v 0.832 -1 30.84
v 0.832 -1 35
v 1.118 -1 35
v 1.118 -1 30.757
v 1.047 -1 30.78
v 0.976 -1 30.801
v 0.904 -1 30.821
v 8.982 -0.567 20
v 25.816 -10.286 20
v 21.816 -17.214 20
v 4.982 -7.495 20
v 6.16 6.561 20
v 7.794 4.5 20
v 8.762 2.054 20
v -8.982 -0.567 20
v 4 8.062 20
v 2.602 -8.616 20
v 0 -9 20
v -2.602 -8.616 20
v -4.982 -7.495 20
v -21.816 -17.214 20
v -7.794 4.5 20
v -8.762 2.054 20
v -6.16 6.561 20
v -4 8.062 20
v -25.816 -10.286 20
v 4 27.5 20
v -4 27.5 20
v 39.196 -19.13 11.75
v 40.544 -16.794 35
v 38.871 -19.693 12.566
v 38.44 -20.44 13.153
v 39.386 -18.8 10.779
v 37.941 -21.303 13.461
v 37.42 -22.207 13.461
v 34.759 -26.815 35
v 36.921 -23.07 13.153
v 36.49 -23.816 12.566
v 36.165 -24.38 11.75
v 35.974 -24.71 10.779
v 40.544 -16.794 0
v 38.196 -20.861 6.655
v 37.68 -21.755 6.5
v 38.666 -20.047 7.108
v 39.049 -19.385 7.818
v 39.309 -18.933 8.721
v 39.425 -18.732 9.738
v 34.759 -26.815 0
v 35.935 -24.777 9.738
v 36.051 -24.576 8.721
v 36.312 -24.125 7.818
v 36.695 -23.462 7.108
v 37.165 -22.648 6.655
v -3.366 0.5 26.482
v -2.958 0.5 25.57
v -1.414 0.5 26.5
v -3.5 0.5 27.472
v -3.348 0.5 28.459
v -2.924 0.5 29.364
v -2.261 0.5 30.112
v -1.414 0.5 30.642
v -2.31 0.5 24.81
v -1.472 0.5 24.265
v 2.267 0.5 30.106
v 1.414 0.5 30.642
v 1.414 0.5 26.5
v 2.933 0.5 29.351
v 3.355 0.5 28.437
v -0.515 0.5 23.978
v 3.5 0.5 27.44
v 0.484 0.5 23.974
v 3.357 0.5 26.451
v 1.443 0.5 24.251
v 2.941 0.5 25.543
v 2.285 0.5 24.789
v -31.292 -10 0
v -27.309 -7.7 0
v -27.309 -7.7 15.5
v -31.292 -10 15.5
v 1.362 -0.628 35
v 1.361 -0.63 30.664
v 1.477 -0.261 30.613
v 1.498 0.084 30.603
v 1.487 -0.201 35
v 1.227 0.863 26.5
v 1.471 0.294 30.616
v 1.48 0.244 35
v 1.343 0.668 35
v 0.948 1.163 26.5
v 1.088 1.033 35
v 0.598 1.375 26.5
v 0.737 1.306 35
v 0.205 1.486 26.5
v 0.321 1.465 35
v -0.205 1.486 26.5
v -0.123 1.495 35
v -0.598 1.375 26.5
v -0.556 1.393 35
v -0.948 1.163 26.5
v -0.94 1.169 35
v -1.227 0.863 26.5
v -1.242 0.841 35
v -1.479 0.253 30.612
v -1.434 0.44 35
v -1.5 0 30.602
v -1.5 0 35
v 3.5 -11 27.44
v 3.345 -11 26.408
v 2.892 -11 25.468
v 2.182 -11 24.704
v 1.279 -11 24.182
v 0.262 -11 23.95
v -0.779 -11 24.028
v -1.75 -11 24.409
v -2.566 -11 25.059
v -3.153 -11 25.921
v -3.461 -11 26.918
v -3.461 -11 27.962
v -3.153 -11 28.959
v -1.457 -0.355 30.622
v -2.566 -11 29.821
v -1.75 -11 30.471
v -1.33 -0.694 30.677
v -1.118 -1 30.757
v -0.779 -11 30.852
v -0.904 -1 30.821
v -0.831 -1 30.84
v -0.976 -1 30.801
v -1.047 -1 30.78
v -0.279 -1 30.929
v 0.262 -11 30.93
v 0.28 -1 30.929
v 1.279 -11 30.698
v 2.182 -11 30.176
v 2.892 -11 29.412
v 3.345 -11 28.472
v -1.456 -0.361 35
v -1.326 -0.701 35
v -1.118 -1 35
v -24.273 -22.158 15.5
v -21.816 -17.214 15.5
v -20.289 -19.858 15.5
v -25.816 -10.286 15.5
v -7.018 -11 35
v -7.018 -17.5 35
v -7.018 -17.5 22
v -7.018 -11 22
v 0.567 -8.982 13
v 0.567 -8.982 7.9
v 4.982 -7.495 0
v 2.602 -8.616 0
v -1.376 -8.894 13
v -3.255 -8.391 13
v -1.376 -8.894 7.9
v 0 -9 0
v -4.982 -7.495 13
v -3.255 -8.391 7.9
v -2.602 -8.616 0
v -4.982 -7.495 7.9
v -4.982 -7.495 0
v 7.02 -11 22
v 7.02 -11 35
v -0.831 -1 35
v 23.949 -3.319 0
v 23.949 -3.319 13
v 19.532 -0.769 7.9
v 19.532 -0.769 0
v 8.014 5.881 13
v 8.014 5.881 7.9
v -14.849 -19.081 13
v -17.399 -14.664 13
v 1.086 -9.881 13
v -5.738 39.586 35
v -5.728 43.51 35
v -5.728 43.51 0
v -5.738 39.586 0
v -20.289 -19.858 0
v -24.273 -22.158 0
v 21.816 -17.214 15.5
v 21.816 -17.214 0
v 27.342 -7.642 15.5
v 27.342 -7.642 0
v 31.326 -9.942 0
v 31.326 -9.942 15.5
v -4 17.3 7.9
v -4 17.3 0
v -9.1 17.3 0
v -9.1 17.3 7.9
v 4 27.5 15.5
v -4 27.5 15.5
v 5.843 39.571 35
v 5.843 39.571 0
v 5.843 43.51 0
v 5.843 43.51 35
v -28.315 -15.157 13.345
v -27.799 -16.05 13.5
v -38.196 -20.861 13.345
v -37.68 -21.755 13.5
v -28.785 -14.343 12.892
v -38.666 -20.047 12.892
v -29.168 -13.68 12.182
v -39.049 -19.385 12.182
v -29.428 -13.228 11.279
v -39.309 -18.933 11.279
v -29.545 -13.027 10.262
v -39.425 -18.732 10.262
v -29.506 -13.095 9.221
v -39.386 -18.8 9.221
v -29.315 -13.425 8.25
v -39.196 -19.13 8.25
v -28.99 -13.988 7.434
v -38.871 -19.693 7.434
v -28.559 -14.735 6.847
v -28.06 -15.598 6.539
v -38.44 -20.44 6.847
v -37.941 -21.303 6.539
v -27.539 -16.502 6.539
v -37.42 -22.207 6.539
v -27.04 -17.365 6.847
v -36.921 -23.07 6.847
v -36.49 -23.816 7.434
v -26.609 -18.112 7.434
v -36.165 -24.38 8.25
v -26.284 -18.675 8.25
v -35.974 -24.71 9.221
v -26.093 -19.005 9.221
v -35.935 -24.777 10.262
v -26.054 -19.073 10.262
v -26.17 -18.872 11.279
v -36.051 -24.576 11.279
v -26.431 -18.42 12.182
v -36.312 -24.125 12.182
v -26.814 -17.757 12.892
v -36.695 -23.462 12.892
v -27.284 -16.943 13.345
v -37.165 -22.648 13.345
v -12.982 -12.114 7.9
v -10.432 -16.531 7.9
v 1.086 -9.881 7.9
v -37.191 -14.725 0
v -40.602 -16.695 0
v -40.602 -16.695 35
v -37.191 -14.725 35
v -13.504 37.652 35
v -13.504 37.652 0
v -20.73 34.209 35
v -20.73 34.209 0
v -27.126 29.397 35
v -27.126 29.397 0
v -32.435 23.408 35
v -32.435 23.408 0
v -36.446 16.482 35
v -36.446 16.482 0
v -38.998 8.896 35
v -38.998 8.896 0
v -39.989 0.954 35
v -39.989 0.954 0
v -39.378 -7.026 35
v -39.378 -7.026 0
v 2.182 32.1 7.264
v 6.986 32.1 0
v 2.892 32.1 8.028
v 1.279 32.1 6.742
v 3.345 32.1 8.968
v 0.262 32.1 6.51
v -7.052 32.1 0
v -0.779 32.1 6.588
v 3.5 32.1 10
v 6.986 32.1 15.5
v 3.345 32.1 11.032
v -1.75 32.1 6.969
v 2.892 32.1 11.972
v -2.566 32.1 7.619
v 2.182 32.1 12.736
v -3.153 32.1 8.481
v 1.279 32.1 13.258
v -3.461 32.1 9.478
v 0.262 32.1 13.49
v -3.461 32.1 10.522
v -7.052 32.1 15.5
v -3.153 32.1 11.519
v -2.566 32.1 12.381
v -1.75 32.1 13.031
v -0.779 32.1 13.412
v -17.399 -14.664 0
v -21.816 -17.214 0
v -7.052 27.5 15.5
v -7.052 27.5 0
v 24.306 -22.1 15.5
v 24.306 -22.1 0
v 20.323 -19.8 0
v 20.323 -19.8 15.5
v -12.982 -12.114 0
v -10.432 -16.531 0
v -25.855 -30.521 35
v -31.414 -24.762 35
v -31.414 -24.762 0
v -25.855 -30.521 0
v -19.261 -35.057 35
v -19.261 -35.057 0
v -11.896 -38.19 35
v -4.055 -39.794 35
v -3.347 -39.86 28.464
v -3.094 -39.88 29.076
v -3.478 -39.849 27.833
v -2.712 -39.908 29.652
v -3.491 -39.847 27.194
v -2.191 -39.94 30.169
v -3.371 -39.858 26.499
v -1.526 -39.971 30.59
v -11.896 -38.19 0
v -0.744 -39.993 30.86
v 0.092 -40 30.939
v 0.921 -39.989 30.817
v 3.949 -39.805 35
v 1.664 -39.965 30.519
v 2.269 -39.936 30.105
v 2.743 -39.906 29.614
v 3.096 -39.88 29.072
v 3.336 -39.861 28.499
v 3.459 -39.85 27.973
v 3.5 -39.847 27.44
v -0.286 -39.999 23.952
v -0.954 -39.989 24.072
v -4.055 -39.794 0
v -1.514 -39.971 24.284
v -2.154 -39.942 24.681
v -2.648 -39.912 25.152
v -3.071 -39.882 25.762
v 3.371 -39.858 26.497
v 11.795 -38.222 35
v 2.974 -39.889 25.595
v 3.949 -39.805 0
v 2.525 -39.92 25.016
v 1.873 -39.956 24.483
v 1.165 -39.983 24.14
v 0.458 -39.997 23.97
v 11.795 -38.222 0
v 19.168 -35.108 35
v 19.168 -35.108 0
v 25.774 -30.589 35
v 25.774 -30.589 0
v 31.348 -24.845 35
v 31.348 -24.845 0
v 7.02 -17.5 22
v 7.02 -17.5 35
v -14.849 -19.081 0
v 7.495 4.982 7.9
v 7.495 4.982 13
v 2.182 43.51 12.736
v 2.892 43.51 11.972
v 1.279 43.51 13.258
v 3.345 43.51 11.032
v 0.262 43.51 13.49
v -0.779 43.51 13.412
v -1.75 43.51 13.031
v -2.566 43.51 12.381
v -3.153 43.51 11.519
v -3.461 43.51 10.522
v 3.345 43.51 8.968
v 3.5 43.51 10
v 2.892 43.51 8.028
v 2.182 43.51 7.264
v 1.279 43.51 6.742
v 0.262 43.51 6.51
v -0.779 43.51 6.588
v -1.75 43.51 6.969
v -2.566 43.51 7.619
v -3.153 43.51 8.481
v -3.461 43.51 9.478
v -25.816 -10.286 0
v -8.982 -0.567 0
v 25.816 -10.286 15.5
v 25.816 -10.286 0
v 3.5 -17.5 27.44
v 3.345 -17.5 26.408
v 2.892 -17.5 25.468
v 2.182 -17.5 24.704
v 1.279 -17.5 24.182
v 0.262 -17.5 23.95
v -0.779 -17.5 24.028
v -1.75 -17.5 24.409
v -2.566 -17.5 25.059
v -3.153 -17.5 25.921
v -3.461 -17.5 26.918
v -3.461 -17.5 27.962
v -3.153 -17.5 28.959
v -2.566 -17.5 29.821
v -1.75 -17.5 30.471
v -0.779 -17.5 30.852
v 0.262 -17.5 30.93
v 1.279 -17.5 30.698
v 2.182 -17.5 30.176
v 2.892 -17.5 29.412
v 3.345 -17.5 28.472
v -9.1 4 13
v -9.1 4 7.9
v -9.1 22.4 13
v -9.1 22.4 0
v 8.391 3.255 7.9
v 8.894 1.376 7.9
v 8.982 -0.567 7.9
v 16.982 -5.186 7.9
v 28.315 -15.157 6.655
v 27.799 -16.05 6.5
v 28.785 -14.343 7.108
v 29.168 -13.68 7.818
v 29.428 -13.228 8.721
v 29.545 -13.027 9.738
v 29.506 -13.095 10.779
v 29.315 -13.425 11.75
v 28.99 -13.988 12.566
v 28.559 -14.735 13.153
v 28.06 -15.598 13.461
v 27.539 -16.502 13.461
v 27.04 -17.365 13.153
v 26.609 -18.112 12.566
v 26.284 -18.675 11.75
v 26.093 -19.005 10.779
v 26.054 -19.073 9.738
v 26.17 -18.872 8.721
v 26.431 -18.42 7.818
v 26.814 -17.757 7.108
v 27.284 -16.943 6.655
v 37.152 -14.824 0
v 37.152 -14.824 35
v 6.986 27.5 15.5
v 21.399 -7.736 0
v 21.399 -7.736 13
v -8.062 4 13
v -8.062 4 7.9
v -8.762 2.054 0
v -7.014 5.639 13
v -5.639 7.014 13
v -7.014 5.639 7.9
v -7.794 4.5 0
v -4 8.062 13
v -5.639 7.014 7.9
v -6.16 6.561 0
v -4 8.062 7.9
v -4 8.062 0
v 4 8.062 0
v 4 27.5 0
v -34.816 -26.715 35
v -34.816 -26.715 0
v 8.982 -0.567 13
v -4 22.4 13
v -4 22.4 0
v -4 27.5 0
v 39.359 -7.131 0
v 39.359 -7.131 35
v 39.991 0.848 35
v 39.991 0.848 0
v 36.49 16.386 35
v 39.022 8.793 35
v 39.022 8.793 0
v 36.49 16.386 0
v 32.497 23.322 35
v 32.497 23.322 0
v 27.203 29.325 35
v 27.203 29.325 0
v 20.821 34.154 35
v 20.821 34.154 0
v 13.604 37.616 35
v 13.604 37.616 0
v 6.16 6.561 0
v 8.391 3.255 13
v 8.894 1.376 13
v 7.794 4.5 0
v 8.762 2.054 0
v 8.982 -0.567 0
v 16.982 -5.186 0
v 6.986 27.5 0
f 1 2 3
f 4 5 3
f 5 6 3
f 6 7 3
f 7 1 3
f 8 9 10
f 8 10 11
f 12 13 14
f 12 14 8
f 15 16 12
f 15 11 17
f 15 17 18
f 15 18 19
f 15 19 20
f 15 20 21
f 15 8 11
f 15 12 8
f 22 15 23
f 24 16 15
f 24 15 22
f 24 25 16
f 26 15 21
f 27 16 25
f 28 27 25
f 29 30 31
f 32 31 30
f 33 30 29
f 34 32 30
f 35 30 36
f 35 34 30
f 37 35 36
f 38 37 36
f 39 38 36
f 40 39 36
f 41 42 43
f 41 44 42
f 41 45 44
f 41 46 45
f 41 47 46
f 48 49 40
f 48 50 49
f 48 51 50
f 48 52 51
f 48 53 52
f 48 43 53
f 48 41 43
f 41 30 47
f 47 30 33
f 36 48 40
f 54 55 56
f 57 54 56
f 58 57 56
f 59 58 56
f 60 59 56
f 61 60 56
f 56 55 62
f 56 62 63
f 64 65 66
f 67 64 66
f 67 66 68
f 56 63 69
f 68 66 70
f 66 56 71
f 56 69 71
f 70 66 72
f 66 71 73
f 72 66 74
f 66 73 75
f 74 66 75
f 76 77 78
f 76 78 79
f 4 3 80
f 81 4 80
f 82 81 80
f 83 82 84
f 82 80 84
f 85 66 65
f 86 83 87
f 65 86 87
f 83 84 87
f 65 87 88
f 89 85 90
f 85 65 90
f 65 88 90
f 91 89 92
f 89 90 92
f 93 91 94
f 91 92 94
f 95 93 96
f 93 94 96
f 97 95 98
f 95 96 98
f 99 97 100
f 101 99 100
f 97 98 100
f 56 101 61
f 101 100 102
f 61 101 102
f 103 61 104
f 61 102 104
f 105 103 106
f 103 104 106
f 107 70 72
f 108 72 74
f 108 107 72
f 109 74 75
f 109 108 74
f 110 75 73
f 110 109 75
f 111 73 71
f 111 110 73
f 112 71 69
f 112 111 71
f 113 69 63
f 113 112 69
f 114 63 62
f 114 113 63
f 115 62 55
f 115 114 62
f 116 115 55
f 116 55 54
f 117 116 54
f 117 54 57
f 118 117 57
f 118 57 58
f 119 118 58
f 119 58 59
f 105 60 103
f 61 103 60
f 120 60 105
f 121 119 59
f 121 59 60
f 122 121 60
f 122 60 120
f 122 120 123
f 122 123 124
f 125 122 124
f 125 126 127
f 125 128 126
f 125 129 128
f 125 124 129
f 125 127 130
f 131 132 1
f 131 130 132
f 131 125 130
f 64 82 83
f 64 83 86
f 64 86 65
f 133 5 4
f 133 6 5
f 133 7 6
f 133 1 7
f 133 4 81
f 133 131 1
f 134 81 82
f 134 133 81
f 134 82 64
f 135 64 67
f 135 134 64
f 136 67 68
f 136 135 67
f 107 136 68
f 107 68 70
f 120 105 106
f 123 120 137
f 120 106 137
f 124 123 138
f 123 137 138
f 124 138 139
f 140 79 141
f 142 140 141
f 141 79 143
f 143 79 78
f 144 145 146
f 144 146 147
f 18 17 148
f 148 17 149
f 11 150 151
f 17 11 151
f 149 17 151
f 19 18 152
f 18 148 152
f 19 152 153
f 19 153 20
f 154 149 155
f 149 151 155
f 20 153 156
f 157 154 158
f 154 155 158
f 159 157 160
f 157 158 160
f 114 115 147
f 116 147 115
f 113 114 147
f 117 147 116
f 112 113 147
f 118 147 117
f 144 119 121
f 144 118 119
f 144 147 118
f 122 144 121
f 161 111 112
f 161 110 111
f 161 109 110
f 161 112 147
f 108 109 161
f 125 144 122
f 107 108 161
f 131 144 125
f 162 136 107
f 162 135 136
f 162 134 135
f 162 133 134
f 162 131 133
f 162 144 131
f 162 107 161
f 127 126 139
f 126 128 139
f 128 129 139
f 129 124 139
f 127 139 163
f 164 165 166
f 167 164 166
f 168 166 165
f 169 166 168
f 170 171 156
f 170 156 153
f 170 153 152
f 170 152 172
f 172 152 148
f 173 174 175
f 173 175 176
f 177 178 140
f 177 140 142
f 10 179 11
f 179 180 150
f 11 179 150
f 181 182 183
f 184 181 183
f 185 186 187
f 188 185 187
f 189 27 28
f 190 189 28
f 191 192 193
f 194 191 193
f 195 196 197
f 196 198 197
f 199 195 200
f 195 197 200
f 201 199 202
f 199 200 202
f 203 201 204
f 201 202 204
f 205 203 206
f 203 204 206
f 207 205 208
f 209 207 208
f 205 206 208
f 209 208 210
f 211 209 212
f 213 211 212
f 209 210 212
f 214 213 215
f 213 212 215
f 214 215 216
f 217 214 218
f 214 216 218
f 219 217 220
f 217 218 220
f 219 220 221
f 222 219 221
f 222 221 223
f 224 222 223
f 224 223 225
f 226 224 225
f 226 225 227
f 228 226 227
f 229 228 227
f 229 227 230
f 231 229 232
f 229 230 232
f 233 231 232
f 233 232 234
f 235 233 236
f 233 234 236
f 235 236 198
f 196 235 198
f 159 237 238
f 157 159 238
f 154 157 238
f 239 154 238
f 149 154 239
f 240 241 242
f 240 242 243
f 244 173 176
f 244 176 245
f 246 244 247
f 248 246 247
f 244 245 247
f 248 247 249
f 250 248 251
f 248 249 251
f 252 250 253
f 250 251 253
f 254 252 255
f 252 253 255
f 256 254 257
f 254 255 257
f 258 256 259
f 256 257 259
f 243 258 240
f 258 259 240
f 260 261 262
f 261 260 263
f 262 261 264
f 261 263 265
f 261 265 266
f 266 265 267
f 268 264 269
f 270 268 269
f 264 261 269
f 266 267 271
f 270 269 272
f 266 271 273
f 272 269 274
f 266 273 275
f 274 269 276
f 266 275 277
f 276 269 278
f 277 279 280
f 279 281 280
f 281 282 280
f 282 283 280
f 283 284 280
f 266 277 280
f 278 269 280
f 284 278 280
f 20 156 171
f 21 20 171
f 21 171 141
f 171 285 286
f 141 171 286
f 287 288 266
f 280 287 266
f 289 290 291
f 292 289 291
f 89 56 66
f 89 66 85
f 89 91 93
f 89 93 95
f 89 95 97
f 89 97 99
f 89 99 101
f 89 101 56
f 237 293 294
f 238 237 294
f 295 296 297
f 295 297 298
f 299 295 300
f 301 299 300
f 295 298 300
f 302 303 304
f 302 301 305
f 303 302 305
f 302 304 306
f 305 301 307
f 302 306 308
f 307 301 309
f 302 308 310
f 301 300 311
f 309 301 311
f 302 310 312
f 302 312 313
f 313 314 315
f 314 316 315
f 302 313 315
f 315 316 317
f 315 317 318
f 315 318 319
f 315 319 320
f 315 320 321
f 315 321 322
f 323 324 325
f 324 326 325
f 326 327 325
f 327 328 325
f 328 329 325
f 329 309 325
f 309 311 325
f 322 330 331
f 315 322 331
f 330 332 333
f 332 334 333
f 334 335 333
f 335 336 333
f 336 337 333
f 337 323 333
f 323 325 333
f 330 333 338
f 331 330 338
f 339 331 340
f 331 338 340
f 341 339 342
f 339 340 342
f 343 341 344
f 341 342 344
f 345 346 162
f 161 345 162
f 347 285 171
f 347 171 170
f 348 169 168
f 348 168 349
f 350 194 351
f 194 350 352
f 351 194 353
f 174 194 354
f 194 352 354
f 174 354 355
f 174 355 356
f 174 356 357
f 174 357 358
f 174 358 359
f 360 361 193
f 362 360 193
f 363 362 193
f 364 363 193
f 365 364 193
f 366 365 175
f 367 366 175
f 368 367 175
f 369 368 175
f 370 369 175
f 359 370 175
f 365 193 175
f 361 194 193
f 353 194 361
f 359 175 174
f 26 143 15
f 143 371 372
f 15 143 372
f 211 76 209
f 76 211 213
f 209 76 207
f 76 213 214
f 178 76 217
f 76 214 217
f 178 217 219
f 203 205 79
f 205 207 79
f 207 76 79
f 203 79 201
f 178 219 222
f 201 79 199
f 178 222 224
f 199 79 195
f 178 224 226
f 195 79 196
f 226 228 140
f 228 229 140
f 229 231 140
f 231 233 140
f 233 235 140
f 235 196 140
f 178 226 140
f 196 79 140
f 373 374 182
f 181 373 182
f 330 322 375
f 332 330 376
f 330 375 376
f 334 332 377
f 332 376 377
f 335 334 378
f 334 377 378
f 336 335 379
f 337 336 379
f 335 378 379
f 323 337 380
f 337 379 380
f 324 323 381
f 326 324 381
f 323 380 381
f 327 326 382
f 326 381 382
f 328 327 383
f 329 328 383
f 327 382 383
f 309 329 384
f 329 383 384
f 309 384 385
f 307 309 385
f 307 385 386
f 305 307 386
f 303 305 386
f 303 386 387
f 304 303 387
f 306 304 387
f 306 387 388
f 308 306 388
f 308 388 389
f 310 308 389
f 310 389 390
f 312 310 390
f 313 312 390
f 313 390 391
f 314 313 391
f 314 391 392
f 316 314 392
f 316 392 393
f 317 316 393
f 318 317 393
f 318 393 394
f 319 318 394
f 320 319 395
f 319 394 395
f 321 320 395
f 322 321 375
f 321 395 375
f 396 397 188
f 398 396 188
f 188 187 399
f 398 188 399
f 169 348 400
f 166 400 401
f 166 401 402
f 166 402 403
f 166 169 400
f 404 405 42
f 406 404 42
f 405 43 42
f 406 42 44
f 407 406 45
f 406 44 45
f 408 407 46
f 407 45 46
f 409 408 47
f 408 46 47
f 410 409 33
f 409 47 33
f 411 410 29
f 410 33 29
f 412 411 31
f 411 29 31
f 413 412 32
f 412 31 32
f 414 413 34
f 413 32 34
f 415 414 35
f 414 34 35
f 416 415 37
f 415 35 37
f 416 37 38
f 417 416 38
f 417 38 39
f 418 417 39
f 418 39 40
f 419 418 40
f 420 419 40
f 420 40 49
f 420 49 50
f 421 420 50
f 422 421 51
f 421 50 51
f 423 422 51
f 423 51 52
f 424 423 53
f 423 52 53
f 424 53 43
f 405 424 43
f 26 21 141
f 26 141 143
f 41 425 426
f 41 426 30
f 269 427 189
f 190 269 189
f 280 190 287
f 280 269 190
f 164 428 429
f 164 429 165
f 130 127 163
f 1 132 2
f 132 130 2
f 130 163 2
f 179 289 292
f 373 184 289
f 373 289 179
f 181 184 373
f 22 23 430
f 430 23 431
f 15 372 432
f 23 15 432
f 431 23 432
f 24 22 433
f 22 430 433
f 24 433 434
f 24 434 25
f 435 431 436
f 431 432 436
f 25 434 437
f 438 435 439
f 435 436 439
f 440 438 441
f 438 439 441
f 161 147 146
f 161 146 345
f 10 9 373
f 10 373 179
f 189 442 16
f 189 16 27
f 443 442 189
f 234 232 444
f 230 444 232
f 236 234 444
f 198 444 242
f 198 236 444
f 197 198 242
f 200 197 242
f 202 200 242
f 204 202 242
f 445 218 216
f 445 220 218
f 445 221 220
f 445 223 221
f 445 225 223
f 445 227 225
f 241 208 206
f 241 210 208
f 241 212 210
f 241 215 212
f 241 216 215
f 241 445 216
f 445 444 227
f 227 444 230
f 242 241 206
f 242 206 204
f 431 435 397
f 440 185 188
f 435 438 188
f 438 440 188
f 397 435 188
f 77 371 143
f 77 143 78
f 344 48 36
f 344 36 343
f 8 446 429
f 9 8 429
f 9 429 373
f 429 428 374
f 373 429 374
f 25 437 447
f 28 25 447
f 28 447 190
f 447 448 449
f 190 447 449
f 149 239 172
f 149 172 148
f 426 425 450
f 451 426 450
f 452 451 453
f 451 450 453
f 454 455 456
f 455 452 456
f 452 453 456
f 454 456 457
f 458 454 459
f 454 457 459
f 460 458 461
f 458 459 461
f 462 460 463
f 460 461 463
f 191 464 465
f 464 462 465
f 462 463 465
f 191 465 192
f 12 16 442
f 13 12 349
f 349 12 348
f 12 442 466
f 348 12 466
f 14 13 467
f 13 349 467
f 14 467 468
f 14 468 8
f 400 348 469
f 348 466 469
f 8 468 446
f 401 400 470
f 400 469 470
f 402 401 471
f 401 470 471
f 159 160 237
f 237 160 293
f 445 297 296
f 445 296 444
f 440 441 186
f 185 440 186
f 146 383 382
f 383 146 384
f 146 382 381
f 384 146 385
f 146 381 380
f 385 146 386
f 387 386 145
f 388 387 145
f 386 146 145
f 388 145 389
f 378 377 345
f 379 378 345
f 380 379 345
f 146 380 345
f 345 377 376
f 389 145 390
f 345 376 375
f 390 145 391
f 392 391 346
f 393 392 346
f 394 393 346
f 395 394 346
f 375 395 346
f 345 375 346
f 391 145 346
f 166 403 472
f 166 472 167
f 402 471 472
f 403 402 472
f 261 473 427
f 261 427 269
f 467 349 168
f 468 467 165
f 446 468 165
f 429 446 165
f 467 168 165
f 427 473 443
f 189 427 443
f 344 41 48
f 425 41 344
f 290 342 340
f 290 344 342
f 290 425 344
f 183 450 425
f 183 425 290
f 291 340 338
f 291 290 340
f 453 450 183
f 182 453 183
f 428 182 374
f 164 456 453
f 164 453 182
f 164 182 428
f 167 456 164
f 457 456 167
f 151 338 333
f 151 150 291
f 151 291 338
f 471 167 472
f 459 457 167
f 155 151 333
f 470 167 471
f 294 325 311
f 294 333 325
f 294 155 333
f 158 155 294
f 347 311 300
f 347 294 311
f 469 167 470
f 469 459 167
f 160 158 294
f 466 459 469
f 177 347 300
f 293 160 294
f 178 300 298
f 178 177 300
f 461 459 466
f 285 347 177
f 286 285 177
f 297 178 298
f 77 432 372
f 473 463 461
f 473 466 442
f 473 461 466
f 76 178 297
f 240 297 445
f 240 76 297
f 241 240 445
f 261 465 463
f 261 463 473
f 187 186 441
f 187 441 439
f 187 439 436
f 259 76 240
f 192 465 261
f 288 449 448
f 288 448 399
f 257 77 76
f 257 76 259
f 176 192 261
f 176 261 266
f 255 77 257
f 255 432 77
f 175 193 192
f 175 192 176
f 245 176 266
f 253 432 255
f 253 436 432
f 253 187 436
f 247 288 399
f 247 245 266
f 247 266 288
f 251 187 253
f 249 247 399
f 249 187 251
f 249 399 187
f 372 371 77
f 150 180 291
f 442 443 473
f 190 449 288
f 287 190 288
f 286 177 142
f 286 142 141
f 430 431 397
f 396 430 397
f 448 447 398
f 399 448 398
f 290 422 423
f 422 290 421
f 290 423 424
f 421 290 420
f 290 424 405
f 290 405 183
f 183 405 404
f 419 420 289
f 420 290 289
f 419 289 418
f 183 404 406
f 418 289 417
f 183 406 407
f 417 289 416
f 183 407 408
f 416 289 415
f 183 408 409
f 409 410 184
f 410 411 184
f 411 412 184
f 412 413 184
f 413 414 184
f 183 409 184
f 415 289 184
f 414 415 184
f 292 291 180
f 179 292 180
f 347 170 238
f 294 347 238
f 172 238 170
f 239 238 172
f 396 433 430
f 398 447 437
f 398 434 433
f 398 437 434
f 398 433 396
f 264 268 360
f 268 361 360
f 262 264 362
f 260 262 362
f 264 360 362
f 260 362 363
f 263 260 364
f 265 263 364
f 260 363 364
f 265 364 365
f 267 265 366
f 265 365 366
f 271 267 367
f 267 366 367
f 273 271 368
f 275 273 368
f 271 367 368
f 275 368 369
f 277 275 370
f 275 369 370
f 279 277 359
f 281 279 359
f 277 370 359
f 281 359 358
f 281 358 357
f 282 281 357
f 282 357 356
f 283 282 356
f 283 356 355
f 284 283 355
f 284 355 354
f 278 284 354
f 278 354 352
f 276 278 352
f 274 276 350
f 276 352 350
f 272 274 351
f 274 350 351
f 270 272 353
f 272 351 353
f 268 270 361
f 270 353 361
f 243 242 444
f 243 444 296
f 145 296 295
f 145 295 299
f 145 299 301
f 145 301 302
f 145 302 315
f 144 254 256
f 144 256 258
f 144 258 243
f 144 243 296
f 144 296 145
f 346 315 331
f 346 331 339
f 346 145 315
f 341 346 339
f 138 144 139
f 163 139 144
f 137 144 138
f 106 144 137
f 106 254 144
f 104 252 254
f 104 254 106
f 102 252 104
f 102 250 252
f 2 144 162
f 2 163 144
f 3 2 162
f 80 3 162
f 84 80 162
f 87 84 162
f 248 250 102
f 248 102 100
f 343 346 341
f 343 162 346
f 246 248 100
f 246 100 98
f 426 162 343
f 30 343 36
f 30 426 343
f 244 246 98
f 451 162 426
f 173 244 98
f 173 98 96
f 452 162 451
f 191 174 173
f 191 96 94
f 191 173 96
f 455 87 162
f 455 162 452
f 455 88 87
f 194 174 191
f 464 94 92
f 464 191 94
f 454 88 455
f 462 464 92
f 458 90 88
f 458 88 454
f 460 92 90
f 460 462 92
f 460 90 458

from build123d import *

# Parameters (mm, degrees)
SKETCH2_R                = 40
BOSS_EXTRUDE1_DEPTH      = 35
SKETCH3_W                = 8
SKETCH3_H                = 35
CUT_EXTRUDE1_DEPTH       = 20
SKETCH4_R                = 3.5
CUT_EXTRUDE2_DEPTH       = 80
SKETCH5_R                = 3.5
CUT_EXTRUDE3_DEPTH       = 50
SKETCH6_R                = 3.5
CUT_EXTRUDE4_DEPTH       = 50
SKETCH8_W                = 14.038446545
SKETCH8_H                = 6.5
CUT_EXTRUDE5_DEPTH       = 15.5
SKETCH11_W               = 8
SKETCH11_H               = 6.5
BOSS_EXTRUDE2_DEPTH      = 4.5
BOSS_EXTRUDE3_DEPTH      = 15.5
BOSS_EXTRUDE4_DEPTH      = 35
SKETCH18_R               = 3.5
CUT_EXTRUDE9_DEPTH       = 25
SKETCH19_R               = 3.5
CUT_EXTRUDE10_DEPTH      = 25
SKETCH20_R               = 3.5
CUT_EXTRUDE11_DEPTH      = 25
SKETCH21_W               = 5.1
SKETCH21_H               = 18.4
CUT_EXTRUDE12_DEPTH      = 13
SKETCH23_W               = 5.1
SKETCH23_H               = 18.4
CUT_EXTRUDE13_DEPTH      = 13
SKETCH22_W               = 5.1
SKETCH22_H               = 13.3
BOSS_EXTRUDE5_DEPTH      = 7.9
CUT_EXTRUDE14_DEPTH      = 8.5
SKETCH25_R               = 9
CUT_EXTRUDE15_DEPTH      = 20
SKETCH27_W               = 14.038446545
SKETCH27_H               = 6.5
CUT_EXTRUDE16_DEPTH      = 13
SKETCH28_R               = 3.5
CUT_EXTRUDE18_DEPTH      = 18
CUT_EXTRUDE18_DEPTH_BACK = 50


with BuildPart() as part:
    # Sketch2 → Boss-Extrude1 (new body)
    with BuildSketch(Plane.XY):
        Circle(SKETCH2_R)
    extrude(amount=BOSS_EXTRUDE1_DEPTH)

    # Sketch3 → Cut-Extrude1 (cut)
    with BuildSketch(Plane(origin=(0, 0, 0), x_dir=(-1, 0, 0), z_dir=(0, 0, -1))):
        with Locations((0, 21.5)):
            Rectangle(SKETCH3_W, SKETCH3_H)
        Polygon((31.774990748, -22.964101615), (35.774990748, -16.035898385), (5.464101615, 1.464101615), (1.464101615, -5.464101615), align=None)
        Polygon((-35.774990748, -16.035898385), (-31.774990748, -22.964101615), (-1.464101615, -5.464101615), (-5.464101615, 1.464101615), align=None)
    extrude(amount=-CUT_EXTRUDE1_DEPTH, mode=Mode.SUBTRACT)

    # Sketch4 → Cut-Extrude2 (cut)
    with BuildSketch(Plane(origin=(-3.464101615, -2, 0), x_dir=(0, 0, 1), z_dir=(-0.866025404, -0.5, 0))):
        with Locations((10, 0)):
            Circle(SKETCH4_R)
    extrude(amount=CUT_EXTRUDE2_DEPTH, mode=Mode.SUBTRACT)

    # Sketch5 → Cut-Extrude3 (cut)
    with BuildSketch(Plane(origin=(0, 4, 0), x_dir=(1, 0, 0), z_dir=(0, 1, 0))):
        with Locations((0, -10)):
            Circle(SKETCH5_R)
    extrude(amount=CUT_EXTRUDE3_DEPTH, mode=Mode.SUBTRACT)

    # Sketch6 → Cut-Extrude4 (cut)
    with BuildSketch(Plane(origin=(3.464101615, -2, 0), x_dir=(0, 0, -1), z_dir=(0.866025404, -0.5, 0))):
        with Locations((-10, 0)):
            Circle(SKETCH6_R)
    extrude(amount=CUT_EXTRUDE4_DEPTH, mode=Mode.SUBTRACT)

    # Sketch8 → Cut-Extrude5 (cut)
    with BuildSketch(Plane(origin=(0, 0, 0), x_dir=(-1, 0, 0), z_dir=(0, 0, -1))):
        Polygon((-32.971083956, -10.892407408), (-25.951860683, -23.050058746), (-20.322695558, -19.800058746), (-27.341918831, -7.642407408), align=None)
        with Locations((0.033217181, 30.75)):
            Rectangle(SKETCH8_W, SKETCH8_H)
        Polygon((27.30870165, -7.699941254), (32.937866774, -10.949941254), (25.918643502, -23.107592592), (20.289478377, -19.857592592), align=None)
    extrude(amount=-CUT_EXTRUDE5_DEPTH, mode=Mode.SUBTRACT)

    # Sketch11 → Boss-Extrude2 (add)
    with BuildSketch(Plane(origin=(0, 0, 20), x_dir=(-1, 0, 0), z_dir=(0, 0, -1))):
        with Locations((0, 30.75)):
            Rectangle(SKETCH11_W, SKETCH11_H)
        Polygon((25.815698604, -10.285898385), (31.444863729, -13.535898385), (27.444863729, -20.464101615), (21.815698604, -17.214101615), align=None)
        Polygon((-21.815698604, -17.214101615), (-27.444863729, -20.464101615), (-31.444863729, -13.535898385), (-25.815698604, -10.285898385), align=None)
    extrude(amount=BOSS_EXTRUDE2_DEPTH)

    # Sketch12 → Boss-Extrude3 (add)
    with BuildSketch(Plane(origin=(0, 0, 15.5), x_dir=(-1, 0, 0), z_dir=(0, 0, -1))):
        Polygon((-6.986006091, 32.1), (7.052440454, 32.1), (7.052440454, 34), (4, 34), (4, 39), (-4, 39), (-4, 34), (-6.986006091, 34), align=None)
        Polygon((25.918643502, -23.107592592), (27.444863729, -20.464101615), (31.774990748, -22.964101615), (35.774990748, -16.035898385), (31.444863729, -13.535898385), (32.937866774, -10.949941254), (31.292418507, -9.999941254), (24.273195235, -22.157592592), align=None)
        Polygon((-32.971083956, -10.892407408), (-31.444863729, -13.535898385), (-35.774990748, -16.035898385), (-31.774990748, -22.964101615), (-27.444863729, -20.464101615), (-25.951860683, -23.050058746), (-24.306412416, -22.100058746), (-31.325635688, -9.942407408), align=None)
    extrude(amount=BOSS_EXTRUDE3_DEPTH)

    # Sketch17 → Boss-Extrude4 (add)
    with BuildSketch(Plane(origin=(0, 0, 0), x_dir=(-1, 0, 0), z_dir=(0, 0, -1))):
        Polygon((-5.842787082, 32.897450406), (-5.842787082, 43.509531182), (5.727819383, 43.509531182), (5.754751517, 32.897450406), align=None)
        Polygon((31.411421312, -11.388723161), (25.612652013, -21.432486209), (34.816449619, -26.715202685), (40.601752851, -16.69476355), align=None)
        Polygon((-25.568634231, -21.508727245), (-31.36740353, -11.464964197), (-40.544269002, -16.794328497), (-34.75896577, -26.814767633), align=None)
    extrude(amount=-BOSS_EXTRUDE4_DEPTH)

    # Sketch18 → Cut-Extrude9 (cut, symmetric)
    with BuildSketch(Plane(origin=(-37.680359311, -21.754765591, 0), x_dir=(0, 0, 1), z_dir=(-0.866025404, -0.5, 0))):
        with Locations((10, 0)):
            Circle(SKETCH18_R)
    extrude(amount=CUT_EXTRUDE9_DEPTH, both=True, mode=Mode.SUBTRACT)

    # Sketch19 → Cut-Extrude10 (cut, symmetric)
    with BuildSketch(Plane(origin=(37.680359311, -21.754765591, 0), x_dir=(0, 0, -1), z_dir=(0.866025404, -0.5, 0))):
        with Locations((-10, 0)):
            Circle(SKETCH19_R)
    extrude(amount=CUT_EXTRUDE10_DEPTH, both=True, mode=Mode.SUBTRACT)

    # Sketch20 → Cut-Extrude11 (cut, symmetric)
    with BuildSketch(Plane(origin=(0, 43.509531182, 0), x_dir=(1, 0, 0), z_dir=(0, 1, 0))):
        with Locations((0, -10)):
            Circle(SKETCH20_R)
    extrude(amount=CUT_EXTRUDE11_DEPTH, both=True, mode=Mode.SUBTRACT)

    # Sketch21 → Cut-Extrude12 (cut)
    with BuildSketch(Plane(origin=(0, 0, 0), x_dir=(-1, 0, 0), z_dir=(0, 0, -1))):
        with Locations((6.55, 13.2)):
            Rectangle(SKETCH21_W, SKETCH21_H)
    extrude(amount=-CUT_EXTRUDE12_DEPTH, mode=Mode.SUBTRACT)

    # Sketch23 → Cut-Extrude13 (cut)
    with BuildSketch(Plane(origin=(0, 0, 0), x_dir=(-1, 0, 0), z_dir=(0, 0, -1))):
        with Locations((6.55, 13.2)):
            Rectangle(SKETCH23_W, SKETCH23_H)
        Polygon((-1.085898385, -9.880831174), (1.464101615, -5.464101615), (17.398969045, -14.664101615), (14.848969045, -19.080831174), align=None)
        Polygon((-8.014101615, 5.880831174), (-5.464101615, 1.464101615), (-21.398969045, -7.735898385), (-23.948969045, -3.319168826), align=None)
    extrude(amount=-CUT_EXTRUDE13_DEPTH, mode=Mode.SUBTRACT)

    # Sketch22 → Boss-Extrude5 (add)
    with BuildSketch(Plane(origin=(0, 0, 0), x_dir=(-1, 0, 0), z_dir=(0, 0, -1))):
        with Locations((6.55, 10.65)):
            Rectangle(SKETCH22_W, SKETCH22_H)
        Polygon((-1.085898385, -9.880831174), (1.464101615, -5.464101615), (12.982239485, -12.114101615), (10.432239485, -16.530831174), align=None)
        Polygon((-8.014101615, 5.880831174), (-5.464101615, 1.464101615), (-16.982239485, -5.185898385), (-19.532239485, -0.769168826), align=None)
    extrude(amount=-BOSS_EXTRUDE5_DEPTH)

    # Sketch24 → Cut-Extrude14 (cut)
    with BuildSketch(Plane.XY.offset(35)):
        with BuildLine():
            Line((0.831568399, -1), (1.11810064, -0.999925477))
            ThreePointArc((1.11810064, -0.999925477), (0.535186435, 1.401276375), (-1.5, 0))
            ThreePointArc((-1.5, 0), (-1.401274891, -0.535190321), (-1.118095094, -0.999931678))
            Line((-1.118095094, -0.999931678), (-0.831313787, -1))
            Line((-0.831313787, -1), (0.831568399, -1))
        make_face()
    extrude(amount=-CUT_EXTRUDE14_DEPTH, mode=Mode.SUBTRACT)

    # Sketch25 → Cut-Extrude15 (cut)
    with BuildSketch(Plane(origin=(0, 0, 0), x_dir=(-1, 0, 0), z_dir=(0, 0, -1))):
        Circle(SKETCH25_R)
    extrude(amount=-CUT_EXTRUDE15_DEPTH, mode=Mode.SUBTRACT)

    # Sketch27 → Cut-Extrude16 (cut)
    with BuildSketch(Plane.XY.offset(35)):
        with Locations((0.000904033, -14.25)):
            Rectangle(SKETCH27_W, SKETCH27_H)
    extrude(amount=-CUT_EXTRUDE16_DEPTH, mode=Mode.SUBTRACT)

    # Sketch28 → Cut-Extrude18 (cut, two sides)
    with BuildSketch(Plane(origin=(0, -17.5, 0), x_dir=(1, 0, 0), z_dir=(0, 1, 0))) as cut_extrude18_sk:
        with Locations((0, -27.44)):
            Circle(SKETCH28_R)
    extrude(amount=CUT_EXTRUDE18_DEPTH, mode=Mode.SUBTRACT)
    extrude(cut_extrude18_sk.sketch, amount=-CUT_EXTRUDE18_DEPTH_BACK, mode=Mode.SUBTRACT)


solid = part.part
